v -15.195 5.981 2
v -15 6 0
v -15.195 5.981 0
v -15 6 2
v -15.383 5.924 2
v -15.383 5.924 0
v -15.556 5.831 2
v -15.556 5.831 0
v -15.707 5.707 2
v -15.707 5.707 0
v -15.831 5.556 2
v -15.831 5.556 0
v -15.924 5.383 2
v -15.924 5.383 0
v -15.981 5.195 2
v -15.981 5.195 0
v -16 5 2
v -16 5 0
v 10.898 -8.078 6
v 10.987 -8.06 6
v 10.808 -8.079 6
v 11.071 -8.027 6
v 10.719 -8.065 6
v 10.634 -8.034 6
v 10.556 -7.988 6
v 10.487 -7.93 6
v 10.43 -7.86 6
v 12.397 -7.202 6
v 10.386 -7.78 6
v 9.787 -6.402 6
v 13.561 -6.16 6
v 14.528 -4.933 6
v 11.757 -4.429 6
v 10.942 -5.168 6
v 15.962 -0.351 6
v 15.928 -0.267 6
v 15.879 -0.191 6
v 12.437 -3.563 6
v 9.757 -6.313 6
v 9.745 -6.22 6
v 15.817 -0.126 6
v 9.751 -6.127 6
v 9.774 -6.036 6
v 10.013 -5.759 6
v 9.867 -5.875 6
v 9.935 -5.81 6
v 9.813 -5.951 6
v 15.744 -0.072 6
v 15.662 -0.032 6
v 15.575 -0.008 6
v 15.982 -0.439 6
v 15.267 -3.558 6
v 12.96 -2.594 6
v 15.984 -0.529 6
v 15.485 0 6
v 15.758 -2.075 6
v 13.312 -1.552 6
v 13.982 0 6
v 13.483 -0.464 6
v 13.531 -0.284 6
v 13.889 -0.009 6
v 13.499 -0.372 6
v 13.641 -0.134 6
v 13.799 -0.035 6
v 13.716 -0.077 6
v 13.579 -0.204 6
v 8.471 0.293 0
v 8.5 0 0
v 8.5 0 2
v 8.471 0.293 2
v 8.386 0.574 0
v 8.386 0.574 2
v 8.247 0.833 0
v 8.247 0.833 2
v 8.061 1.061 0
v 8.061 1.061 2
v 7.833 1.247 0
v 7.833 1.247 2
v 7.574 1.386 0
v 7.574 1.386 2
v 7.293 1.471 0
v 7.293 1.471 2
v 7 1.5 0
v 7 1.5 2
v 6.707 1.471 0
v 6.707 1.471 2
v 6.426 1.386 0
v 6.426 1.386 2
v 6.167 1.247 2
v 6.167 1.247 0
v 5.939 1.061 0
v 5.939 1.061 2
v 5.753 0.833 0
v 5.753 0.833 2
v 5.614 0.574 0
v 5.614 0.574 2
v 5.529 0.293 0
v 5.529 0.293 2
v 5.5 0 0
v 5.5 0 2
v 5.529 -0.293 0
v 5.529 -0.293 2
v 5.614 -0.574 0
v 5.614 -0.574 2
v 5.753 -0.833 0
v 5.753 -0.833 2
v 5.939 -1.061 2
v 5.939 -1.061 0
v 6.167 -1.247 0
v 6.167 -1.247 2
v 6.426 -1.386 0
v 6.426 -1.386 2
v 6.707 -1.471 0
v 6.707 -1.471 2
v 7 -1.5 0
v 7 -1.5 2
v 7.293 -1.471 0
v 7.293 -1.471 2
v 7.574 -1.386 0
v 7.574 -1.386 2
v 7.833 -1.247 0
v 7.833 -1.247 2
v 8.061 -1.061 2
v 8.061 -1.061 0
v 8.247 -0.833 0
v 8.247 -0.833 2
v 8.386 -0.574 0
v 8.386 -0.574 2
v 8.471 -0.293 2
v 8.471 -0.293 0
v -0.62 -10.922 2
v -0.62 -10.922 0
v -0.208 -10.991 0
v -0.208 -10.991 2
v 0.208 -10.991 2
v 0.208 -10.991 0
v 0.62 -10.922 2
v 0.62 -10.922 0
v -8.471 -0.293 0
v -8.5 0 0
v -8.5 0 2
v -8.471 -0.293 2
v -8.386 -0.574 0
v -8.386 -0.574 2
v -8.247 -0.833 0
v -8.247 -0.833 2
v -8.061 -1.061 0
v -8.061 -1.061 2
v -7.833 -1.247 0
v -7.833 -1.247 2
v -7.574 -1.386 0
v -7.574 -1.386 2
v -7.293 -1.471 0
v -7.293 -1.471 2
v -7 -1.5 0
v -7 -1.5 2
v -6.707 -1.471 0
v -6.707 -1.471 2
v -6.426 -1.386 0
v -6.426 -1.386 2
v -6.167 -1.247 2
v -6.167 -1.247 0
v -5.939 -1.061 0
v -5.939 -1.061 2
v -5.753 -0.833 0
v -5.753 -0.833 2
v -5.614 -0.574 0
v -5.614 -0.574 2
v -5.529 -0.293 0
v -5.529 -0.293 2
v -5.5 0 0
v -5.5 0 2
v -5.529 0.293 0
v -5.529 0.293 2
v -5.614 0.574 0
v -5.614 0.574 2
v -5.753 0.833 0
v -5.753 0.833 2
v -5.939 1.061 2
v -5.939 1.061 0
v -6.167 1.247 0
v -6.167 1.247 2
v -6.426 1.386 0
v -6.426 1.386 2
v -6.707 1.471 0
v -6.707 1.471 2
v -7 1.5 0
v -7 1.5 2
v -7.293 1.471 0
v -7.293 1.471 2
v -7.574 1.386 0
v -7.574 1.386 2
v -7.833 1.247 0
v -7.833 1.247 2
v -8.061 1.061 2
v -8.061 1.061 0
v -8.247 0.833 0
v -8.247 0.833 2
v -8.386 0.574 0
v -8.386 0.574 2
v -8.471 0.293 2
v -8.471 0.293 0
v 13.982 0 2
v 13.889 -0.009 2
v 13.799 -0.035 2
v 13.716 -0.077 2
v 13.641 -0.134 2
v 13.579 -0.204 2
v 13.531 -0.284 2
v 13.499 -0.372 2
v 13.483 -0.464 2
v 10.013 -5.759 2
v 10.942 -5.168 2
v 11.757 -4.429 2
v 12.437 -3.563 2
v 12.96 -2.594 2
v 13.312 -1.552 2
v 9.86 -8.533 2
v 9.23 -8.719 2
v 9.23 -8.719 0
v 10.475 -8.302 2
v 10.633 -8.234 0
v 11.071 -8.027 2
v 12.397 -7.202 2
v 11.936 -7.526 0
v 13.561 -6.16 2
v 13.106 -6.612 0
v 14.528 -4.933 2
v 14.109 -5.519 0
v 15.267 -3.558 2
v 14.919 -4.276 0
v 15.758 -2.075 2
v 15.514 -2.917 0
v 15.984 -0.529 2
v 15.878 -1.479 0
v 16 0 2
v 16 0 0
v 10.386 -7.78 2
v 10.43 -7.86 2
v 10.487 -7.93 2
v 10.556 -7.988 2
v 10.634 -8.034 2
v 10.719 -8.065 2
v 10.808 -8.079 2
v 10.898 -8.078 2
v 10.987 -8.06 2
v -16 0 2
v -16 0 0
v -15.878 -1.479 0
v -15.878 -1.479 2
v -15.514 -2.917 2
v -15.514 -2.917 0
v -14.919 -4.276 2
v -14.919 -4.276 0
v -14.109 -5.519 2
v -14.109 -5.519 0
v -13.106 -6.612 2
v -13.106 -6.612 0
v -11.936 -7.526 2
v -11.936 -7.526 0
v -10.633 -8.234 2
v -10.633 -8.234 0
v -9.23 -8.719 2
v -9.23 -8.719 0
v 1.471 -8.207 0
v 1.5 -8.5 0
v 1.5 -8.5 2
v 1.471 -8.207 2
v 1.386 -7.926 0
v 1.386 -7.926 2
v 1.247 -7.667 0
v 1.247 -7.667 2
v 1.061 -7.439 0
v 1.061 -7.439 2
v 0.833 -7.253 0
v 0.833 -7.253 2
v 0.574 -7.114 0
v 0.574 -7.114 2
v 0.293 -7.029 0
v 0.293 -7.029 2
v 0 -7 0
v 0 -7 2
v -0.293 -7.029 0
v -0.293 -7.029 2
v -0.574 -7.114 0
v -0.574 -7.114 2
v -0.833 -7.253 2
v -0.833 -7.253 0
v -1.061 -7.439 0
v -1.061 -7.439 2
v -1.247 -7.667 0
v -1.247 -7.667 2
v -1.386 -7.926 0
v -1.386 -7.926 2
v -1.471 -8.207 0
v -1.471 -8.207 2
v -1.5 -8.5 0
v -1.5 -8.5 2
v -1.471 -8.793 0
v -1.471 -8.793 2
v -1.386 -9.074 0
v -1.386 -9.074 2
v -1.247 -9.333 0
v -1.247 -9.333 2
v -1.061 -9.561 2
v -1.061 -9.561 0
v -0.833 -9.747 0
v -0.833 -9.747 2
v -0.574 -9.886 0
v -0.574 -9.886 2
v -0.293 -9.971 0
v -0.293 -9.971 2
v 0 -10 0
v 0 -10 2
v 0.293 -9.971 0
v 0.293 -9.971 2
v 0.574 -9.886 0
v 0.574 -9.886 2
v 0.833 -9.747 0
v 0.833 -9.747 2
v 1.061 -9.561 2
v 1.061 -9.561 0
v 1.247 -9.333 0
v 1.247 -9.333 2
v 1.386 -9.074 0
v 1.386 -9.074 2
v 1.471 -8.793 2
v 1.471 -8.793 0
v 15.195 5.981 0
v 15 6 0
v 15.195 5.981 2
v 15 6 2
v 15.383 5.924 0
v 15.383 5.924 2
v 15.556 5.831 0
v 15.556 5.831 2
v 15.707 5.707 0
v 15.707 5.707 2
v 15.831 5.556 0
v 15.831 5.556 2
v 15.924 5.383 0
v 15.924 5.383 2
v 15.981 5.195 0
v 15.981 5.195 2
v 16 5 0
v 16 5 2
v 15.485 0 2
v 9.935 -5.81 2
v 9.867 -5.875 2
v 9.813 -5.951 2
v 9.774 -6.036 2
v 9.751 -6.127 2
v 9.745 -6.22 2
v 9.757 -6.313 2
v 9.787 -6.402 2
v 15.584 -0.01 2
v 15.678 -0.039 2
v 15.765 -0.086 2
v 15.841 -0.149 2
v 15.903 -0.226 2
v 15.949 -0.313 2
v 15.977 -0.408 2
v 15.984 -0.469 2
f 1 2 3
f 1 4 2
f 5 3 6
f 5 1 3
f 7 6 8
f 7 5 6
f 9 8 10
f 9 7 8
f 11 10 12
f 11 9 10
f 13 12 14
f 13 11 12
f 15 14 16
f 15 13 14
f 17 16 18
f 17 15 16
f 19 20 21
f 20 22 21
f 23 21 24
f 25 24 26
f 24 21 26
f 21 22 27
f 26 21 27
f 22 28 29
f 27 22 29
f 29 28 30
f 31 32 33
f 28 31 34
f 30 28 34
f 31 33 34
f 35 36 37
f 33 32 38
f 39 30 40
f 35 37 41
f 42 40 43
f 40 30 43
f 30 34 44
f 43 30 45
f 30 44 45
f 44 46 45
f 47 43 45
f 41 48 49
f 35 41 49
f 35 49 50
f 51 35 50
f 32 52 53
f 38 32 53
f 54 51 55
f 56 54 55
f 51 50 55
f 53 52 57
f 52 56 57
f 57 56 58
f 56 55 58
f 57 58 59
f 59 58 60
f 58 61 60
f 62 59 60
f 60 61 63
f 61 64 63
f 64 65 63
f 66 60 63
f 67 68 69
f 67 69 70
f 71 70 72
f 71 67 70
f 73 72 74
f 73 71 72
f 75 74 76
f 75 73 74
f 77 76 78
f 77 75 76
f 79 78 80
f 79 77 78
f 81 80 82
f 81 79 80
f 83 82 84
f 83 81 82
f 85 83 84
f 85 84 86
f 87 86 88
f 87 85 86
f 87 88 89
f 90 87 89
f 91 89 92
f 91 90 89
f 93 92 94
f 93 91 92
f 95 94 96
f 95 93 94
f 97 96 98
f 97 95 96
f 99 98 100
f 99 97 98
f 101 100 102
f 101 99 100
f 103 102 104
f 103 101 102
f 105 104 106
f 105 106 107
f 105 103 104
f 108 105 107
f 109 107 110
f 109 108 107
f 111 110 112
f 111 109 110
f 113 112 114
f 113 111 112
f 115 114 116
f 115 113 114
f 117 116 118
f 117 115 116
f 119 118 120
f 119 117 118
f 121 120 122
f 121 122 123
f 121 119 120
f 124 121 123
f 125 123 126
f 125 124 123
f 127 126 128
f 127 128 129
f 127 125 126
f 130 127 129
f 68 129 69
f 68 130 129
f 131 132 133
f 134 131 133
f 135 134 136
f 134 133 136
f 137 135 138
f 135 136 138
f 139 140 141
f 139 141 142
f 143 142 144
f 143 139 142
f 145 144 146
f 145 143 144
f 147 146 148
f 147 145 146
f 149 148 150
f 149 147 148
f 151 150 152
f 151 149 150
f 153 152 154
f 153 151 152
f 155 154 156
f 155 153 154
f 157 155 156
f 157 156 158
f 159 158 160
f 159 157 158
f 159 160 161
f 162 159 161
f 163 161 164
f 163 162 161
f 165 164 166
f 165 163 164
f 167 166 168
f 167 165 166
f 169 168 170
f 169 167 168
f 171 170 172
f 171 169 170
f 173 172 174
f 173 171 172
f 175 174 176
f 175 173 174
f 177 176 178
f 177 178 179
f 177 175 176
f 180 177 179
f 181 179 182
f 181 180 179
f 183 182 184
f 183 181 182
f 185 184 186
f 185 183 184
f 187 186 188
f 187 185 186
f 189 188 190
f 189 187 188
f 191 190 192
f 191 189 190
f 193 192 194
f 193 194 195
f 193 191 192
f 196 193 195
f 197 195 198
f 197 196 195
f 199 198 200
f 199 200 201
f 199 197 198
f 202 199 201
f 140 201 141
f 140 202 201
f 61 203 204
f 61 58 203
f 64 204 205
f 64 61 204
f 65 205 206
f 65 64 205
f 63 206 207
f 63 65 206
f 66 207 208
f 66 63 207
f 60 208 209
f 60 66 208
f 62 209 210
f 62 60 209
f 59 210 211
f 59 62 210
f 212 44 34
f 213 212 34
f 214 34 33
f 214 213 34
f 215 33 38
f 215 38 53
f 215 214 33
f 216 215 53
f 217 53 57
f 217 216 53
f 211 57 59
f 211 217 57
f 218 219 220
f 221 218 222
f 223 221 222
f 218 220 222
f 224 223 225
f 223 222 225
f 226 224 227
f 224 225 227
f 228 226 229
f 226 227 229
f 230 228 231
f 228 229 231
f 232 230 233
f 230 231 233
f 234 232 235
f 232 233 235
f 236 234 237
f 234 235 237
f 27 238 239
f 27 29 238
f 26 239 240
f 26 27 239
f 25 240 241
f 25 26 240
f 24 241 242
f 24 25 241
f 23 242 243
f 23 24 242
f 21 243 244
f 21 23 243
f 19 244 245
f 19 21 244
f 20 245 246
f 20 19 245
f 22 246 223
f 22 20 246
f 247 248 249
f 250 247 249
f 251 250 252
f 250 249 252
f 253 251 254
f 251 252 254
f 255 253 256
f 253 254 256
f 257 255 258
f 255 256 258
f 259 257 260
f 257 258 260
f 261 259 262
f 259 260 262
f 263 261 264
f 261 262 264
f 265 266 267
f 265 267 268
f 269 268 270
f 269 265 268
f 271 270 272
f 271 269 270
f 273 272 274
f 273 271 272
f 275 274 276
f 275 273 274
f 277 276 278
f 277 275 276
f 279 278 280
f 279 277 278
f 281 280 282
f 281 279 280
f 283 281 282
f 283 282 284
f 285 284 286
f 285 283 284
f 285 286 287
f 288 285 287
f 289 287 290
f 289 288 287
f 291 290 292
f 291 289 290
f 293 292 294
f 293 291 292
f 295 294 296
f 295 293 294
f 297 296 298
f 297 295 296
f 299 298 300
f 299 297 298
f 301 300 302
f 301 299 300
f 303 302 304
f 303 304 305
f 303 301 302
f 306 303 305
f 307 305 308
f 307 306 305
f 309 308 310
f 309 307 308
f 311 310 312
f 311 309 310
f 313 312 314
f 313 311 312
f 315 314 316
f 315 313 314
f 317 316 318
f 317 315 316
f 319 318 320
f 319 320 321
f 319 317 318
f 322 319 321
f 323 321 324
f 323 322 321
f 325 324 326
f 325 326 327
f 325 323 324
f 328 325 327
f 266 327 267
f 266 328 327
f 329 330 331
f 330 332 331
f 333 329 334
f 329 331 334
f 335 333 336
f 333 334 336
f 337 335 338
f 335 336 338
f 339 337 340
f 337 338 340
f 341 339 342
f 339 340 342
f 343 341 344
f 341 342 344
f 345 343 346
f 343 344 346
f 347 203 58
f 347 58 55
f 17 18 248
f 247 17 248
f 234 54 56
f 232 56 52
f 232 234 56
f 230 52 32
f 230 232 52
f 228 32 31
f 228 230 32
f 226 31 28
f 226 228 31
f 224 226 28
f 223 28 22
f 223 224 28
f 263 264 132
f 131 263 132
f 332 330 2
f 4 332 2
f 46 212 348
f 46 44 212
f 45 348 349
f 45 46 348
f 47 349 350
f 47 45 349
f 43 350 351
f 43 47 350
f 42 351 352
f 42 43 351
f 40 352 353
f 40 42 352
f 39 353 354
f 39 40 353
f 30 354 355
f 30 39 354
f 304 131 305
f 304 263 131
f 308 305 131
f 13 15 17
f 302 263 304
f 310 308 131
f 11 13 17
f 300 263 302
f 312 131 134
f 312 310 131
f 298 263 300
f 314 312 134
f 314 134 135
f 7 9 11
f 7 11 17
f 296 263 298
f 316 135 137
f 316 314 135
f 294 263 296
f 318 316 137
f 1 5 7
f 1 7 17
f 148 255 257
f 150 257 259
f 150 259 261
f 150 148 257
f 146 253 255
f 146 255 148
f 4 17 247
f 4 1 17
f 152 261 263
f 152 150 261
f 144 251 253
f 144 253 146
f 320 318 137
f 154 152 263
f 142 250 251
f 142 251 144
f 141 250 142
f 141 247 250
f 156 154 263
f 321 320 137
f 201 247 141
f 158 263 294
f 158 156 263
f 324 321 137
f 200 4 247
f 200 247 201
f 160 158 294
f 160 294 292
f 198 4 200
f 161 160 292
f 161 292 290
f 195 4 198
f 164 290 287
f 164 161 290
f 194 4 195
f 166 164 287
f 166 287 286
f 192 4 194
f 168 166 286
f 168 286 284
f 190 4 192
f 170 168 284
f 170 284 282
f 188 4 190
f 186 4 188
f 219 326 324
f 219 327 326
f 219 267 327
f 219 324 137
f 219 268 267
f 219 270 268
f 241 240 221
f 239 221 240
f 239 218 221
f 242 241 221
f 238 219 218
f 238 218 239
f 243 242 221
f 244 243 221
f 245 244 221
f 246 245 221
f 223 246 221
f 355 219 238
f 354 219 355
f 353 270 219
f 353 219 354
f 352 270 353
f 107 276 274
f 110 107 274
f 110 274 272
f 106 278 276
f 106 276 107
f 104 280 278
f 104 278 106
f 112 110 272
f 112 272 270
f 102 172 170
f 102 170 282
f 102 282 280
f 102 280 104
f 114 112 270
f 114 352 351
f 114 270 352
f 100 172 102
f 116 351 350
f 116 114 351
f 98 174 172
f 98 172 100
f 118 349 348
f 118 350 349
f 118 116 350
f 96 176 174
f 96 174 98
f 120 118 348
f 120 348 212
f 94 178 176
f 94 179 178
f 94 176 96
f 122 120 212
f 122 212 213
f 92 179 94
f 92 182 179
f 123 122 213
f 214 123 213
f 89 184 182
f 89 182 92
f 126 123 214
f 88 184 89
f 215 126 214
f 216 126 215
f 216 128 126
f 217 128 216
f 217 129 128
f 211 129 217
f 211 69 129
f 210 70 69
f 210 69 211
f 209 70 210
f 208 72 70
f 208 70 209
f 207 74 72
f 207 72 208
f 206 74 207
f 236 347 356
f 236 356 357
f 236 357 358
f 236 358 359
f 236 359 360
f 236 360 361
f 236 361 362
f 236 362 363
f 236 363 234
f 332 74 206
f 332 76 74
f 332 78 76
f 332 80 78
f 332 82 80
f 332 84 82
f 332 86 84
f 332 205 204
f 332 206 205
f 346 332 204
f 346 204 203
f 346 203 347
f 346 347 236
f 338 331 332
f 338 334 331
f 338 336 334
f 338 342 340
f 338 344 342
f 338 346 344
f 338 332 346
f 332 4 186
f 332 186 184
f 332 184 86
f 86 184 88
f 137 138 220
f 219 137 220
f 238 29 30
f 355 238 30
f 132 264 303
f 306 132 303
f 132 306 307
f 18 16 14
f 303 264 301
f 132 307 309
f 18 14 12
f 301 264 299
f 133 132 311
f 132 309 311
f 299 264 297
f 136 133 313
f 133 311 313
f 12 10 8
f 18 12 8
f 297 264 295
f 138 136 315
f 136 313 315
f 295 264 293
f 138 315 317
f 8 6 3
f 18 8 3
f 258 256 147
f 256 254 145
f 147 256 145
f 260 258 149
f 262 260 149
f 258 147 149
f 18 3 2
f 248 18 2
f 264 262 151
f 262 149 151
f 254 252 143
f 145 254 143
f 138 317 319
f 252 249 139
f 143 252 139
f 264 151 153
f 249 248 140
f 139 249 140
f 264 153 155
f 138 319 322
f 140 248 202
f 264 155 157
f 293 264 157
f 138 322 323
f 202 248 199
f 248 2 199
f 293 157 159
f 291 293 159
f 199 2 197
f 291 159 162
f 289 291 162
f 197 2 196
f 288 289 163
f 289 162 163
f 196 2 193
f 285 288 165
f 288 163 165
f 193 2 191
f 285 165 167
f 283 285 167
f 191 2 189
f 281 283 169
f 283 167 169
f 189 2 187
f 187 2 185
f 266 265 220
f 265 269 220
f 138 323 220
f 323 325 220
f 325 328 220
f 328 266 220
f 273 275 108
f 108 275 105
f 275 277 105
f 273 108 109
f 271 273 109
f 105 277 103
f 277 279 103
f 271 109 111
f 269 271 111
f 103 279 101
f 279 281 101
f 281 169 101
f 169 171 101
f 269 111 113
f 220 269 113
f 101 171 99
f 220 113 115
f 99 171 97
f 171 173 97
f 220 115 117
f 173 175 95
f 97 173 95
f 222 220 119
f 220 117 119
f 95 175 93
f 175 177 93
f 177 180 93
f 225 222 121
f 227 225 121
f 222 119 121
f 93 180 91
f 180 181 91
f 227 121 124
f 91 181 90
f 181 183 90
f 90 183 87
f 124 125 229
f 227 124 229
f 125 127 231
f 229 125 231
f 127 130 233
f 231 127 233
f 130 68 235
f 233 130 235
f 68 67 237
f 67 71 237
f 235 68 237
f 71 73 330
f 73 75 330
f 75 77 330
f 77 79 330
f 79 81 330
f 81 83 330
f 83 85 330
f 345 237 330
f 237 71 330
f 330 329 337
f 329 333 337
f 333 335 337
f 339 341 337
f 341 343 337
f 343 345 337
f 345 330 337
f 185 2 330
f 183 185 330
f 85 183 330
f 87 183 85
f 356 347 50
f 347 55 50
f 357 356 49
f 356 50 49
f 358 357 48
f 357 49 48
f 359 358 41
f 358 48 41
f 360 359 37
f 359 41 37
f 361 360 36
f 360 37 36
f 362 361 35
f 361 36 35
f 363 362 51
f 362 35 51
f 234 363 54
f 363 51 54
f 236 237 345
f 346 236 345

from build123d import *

# Parameters (mm, degrees)
SKETCH_2_R      = 1.5
EXTRUDE_1_DEPTH = 2
EXTRUDE_2_DEPTH = 4
FILLET_1_R      = 1
FILLET_4_R      = 0.5


with BuildPart() as part:
    # 草图2 → 凸台-拉伸1 (new body)
    with BuildSketch(Plane.XY):
        with BuildLine():
            Line((7, 6), (-7, 6))
            Line((-7, 6), (-16, 6))
            Line((-16, 6), (-16, 0))
            ThreePointArc((-16, 0), (-14.108952351, -5.519311231), (-9.230489674, -8.71922679))
            Line((-9.230489674, -8.71922679), (-0.619580465, -10.922007442))
            ThreePointArc((-0.619580465, -10.922007442), (0, -11), (0.619580465, -10.922007442))
            Line((0.619580465, -10.922007442), (9.230489674, -8.71922679))
            ThreePointArc((9.230489674, -8.71922679), (14.108952351, -5.519311231), (16, 0))
            Line((16, 0), (16, 6))
            Line((16, 6), (7, 6))
        make_face()
        with Locations((0, -8.5)):
            Circle(SKETCH_2_R, mode=Mode.SUBTRACT)
        with Locations((7, 0)):
            Circle(SKETCH_2_R, mode=Mode.SUBTRACT)
        with Locations(Location((-7, 0, 0), (0, 0, 180))):
            Circle(SKETCH_2_R, mode=Mode.SUBTRACT)
    extrude(amount=EXTRUDE_1_DEPTH)

    # 草图3 → 凸台-拉伸2 (add)
    with BuildSketch(Plane.XY.offset(2)):
        with BuildLine():
            Line((13.5, 0), (16, 0))
            ThreePointArc((16, 0), (14.527522767, -4.933193793), (10.591910889, -8.252161909))
            Line((10.591910889, -8.252161909), (9.594157864, -5.959894712))
            ThreePointArc((9.594157864, -5.959894712), (12.43654422, -3.562862184), (13.5, 0))
        make_face()
    extrude(amount=EXTRUDE_2_DEPTH)

    # 圆角1
    fillet_1_edges = [part.edges().sort_by_distance(p)[0] for p in [
        (-16, 6, 1),
        (16, 6, 1),
    ]]
    fillet(fillet_1_edges, radius=FILLET_1_R)

    # 圆角4
    fillet_4_edges = [part.edges().sort_by_distance(p)[0] for p in [
        (10.591910889, -8.252161909, 4),
        (16, 0, 4),
        (13.5, 0, 4),
        (9.594157864, -5.959894712, 4),
    ]]
    fillet(fillet_4_edges, radius=FILLET_4_R)


solid = part.part
